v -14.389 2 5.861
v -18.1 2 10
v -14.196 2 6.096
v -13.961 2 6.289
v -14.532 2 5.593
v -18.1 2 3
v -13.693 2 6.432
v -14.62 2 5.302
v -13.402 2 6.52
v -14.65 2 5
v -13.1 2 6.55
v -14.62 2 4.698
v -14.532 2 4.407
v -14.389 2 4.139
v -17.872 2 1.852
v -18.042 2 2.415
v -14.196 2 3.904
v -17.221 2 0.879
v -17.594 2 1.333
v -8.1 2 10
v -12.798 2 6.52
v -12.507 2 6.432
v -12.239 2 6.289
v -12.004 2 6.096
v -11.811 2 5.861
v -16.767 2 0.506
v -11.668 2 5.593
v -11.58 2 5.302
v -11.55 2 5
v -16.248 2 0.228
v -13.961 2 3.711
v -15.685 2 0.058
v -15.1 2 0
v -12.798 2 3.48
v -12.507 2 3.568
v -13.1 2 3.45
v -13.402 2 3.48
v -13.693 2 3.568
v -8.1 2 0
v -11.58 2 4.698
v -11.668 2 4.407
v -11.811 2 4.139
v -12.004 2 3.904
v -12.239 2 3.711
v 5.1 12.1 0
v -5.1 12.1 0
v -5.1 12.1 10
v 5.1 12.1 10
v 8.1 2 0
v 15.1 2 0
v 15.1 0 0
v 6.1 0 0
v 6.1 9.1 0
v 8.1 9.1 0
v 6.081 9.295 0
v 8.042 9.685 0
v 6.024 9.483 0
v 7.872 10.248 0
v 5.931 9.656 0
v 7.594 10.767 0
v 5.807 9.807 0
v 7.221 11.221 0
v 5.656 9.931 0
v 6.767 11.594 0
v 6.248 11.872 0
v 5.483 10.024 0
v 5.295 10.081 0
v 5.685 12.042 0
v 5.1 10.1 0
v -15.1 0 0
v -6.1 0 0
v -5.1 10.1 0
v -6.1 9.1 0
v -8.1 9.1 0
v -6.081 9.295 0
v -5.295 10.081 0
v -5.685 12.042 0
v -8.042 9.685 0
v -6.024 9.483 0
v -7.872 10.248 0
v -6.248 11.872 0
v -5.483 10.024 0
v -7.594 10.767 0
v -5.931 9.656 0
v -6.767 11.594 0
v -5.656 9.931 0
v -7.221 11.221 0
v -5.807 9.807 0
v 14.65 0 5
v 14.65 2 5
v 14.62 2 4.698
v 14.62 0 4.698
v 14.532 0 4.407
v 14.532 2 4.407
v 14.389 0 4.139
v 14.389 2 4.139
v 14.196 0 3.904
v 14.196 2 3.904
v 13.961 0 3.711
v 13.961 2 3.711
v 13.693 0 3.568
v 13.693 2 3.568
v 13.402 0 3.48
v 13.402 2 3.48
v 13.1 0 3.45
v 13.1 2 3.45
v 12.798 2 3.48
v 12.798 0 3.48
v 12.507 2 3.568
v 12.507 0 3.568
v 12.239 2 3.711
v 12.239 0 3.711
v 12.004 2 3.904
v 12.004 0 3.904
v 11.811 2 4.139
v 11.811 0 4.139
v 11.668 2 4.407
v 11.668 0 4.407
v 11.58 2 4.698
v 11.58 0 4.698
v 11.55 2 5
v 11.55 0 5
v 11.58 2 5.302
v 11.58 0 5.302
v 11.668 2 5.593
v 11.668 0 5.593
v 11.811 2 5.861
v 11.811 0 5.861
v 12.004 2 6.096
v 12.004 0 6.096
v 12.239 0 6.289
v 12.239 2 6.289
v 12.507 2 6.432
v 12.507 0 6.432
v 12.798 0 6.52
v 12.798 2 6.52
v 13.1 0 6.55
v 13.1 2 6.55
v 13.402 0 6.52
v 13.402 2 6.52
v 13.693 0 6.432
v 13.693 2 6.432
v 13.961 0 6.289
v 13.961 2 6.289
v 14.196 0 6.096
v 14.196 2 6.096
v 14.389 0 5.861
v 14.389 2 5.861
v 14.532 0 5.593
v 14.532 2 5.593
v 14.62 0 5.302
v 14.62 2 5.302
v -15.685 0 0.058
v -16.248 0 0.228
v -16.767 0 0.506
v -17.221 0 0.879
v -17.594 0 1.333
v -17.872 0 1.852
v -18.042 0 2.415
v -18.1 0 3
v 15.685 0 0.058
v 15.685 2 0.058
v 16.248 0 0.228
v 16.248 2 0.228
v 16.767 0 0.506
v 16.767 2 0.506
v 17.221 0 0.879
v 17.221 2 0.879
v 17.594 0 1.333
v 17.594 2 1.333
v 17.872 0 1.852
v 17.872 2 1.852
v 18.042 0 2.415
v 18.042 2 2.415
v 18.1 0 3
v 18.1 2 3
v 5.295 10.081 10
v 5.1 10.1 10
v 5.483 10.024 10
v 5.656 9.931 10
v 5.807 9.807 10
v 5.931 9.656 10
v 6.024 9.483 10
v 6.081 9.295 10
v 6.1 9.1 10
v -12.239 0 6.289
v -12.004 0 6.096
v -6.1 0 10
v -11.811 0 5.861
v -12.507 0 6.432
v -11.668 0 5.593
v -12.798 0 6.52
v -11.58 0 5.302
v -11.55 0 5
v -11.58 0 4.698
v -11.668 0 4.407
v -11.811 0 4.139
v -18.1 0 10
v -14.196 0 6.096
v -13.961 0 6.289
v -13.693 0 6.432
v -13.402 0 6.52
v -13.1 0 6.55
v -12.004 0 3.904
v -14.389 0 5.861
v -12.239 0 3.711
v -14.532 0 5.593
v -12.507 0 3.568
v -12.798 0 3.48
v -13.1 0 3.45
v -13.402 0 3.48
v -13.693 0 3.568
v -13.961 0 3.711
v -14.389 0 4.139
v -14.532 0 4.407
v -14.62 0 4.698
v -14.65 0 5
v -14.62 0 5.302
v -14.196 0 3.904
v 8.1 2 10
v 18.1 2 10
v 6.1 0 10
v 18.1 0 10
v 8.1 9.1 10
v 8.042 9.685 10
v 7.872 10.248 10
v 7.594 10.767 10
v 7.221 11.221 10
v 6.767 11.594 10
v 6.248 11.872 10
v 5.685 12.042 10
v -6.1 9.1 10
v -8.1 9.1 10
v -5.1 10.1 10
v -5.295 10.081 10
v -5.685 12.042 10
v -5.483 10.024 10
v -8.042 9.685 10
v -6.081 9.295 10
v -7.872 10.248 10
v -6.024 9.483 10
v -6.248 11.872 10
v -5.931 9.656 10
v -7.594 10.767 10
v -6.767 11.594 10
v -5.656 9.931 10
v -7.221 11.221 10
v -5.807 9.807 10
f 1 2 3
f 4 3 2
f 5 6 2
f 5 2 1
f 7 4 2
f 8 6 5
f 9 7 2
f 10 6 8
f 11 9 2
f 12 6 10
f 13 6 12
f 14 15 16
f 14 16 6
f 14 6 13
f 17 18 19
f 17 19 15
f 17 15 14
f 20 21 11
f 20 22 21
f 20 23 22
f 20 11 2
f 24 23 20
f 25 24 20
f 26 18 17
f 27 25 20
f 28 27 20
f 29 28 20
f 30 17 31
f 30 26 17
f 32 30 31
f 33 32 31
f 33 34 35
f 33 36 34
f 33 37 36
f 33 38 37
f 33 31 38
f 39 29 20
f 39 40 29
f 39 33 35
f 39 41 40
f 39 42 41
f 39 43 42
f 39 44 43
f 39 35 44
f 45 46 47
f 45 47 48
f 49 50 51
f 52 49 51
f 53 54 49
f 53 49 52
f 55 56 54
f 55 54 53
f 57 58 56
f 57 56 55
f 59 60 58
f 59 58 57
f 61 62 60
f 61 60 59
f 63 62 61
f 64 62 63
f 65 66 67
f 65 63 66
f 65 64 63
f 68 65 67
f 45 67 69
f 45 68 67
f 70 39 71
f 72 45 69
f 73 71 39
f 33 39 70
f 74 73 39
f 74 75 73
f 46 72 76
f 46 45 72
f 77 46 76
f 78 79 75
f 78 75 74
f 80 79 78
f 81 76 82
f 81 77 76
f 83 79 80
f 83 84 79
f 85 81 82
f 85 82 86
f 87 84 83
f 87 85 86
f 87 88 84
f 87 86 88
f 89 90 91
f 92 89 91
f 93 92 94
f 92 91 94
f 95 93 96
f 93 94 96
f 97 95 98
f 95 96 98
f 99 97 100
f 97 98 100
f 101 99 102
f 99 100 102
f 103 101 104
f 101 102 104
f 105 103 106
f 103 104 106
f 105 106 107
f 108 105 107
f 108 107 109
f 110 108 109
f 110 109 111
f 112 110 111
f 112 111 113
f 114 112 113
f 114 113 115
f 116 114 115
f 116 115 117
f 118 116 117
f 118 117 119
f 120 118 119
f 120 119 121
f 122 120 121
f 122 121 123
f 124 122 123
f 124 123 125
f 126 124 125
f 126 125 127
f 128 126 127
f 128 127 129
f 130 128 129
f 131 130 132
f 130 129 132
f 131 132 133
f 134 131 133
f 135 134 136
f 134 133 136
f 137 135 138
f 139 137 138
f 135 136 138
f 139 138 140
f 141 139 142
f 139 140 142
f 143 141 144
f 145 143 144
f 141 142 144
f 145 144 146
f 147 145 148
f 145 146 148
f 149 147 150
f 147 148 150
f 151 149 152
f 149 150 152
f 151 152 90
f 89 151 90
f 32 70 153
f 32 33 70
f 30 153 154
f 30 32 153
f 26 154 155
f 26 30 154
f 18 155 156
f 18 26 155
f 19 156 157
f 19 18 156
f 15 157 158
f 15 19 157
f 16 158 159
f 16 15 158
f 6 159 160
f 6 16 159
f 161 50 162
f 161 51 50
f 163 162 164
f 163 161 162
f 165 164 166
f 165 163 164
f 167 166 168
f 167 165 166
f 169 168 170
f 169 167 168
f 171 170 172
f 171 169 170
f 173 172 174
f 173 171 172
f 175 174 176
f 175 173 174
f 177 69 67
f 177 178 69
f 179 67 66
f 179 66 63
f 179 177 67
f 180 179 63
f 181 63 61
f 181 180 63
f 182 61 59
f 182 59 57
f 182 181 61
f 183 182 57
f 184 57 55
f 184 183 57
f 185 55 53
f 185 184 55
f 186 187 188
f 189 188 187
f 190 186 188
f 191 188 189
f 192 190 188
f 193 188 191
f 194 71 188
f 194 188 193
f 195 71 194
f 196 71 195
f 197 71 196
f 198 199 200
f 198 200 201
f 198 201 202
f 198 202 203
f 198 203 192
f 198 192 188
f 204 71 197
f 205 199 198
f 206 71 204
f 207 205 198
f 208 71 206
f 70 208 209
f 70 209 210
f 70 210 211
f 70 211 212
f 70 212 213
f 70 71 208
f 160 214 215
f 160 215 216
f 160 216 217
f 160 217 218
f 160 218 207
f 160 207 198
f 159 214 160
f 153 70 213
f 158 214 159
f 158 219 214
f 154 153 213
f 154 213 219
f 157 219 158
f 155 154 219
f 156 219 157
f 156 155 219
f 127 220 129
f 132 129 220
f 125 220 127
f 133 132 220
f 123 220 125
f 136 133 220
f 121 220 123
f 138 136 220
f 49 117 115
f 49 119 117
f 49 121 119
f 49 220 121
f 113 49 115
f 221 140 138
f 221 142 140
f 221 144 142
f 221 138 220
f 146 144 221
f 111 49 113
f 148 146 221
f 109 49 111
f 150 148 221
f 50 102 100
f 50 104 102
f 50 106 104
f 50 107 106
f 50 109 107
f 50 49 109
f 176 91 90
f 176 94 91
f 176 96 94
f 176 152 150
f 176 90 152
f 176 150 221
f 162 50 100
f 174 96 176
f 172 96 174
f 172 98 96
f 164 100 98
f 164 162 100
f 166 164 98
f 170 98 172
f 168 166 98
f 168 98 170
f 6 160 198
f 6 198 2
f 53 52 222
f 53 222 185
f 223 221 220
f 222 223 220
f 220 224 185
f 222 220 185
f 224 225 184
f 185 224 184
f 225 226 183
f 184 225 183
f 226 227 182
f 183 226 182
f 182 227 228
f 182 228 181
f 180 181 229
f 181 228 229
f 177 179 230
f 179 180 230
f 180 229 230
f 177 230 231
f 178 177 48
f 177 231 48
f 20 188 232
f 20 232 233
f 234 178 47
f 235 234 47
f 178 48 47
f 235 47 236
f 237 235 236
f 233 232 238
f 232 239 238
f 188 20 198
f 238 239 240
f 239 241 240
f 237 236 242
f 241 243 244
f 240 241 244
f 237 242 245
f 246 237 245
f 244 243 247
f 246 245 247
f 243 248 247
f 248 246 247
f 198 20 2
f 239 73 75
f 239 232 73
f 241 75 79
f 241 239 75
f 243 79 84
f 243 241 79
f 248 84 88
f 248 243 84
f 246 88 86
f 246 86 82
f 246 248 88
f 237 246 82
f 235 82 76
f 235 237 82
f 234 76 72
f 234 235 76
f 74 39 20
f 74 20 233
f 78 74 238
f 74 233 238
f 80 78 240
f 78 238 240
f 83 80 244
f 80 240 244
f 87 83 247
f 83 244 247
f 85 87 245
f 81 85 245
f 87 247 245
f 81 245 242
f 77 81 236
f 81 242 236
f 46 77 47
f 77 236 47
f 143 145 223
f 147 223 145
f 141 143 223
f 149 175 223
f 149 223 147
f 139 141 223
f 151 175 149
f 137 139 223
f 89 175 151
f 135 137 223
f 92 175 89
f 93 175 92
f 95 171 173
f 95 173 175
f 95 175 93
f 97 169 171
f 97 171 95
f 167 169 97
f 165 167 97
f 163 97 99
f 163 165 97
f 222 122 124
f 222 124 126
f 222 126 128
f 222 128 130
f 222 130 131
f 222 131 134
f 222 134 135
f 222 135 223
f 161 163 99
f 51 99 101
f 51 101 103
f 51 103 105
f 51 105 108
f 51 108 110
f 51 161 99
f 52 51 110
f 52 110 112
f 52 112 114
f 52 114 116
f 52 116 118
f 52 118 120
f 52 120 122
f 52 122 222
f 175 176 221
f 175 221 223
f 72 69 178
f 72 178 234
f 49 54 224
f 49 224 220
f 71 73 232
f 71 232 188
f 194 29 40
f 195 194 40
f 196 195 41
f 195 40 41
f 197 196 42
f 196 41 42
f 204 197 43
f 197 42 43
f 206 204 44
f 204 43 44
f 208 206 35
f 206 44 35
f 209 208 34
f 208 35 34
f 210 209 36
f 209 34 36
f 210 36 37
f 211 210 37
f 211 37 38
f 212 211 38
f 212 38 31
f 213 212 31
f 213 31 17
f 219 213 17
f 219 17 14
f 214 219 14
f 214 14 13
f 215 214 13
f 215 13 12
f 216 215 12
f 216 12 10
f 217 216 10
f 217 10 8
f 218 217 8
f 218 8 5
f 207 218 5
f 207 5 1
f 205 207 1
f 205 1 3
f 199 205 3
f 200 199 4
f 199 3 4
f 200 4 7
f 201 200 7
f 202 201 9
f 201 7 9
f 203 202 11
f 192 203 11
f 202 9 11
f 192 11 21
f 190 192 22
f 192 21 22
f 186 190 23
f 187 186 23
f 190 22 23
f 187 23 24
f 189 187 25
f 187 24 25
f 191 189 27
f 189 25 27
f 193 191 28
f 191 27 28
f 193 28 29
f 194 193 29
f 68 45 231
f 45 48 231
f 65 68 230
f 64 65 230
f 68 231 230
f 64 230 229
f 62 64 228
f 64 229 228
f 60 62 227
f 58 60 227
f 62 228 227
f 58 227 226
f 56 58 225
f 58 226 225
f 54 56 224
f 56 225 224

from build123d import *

# Parameters (mm, degrees)
BOSS_EXTRUDE1_DEPTH = 10
SKETCH2_R           = 1.55
CUT_EXTRUDE1_DEPTH  = 10
SKETCH3_R           = 1.55
CUT_EXTRUDE2_DEPTH  = 10
FILLET1_R           = 3
FILLET2_R           = 3
FILLET3_R           = 1


with BuildPart() as part:
    # Sketch1 → Boss-Extrude1 (new body)
    with BuildSketch(Plane.XY):
        Polygon((6.1, 10.1), (-6.1, 10.1), (-6.1, 0), (-18.1, 0), (-18.1, 2), (-8.1, 2), (-8.1, 12.1), (8.1, 12.1), (8.1, 2), (18.1, 2), (18.1, 0), (6.1, 0), align=None)
    extrude(amount=BOSS_EXTRUDE1_DEPTH)

    # Sketch2 → Cut-Extrude1 (cut)
    with BuildSketch(Plane(origin=(0, 2, 0), x_dir=(1, 0, 0), z_dir=(0, 1, 0))):
        with Locations((-13.1, -5)):
            Circle(SKETCH2_R)
    extrude(amount=-CUT_EXTRUDE1_DEPTH, mode=Mode.SUBTRACT)

    # Sketch3 → Cut-Extrude2 (cut)
    with BuildSketch(Plane(origin=(0, 2, 0), x_dir=(1, 0, 0), z_dir=(0, 1, 0))):
        with Locations((13.1, -5)):
            Circle(SKETCH3_R)
    extrude(amount=-CUT_EXTRUDE2_DEPTH, mode=Mode.SUBTRACT)

    # Fillet1
    fillet1_edges = [part.edges().sort_by_distance(p)[0] for p in [
        (-18.1, 1, 0),
        (18.1, 1, 0),
    ]]
    fillet(fillet1_edges, radius=FILLET1_R)

    # Fillet2
    fillet2_edges = [part.edges().sort_by_distance(p)[0] for p in [
        (-8.1, 12.1, 5),
        (8.1, 12.1, 5),
    ]]
    fillet(fillet2_edges, radius=FILLET2_R)

    # Fillet3
    fillet3_edges = [part.edges().sort_by_distance(p)[0] for p in [
        (6.1, 10.1, 5),
        (-6.1, 10.1, 5),
    ]]
    fillet(fillet3_edges, radius=FILLET3_R)


solid = part.part
